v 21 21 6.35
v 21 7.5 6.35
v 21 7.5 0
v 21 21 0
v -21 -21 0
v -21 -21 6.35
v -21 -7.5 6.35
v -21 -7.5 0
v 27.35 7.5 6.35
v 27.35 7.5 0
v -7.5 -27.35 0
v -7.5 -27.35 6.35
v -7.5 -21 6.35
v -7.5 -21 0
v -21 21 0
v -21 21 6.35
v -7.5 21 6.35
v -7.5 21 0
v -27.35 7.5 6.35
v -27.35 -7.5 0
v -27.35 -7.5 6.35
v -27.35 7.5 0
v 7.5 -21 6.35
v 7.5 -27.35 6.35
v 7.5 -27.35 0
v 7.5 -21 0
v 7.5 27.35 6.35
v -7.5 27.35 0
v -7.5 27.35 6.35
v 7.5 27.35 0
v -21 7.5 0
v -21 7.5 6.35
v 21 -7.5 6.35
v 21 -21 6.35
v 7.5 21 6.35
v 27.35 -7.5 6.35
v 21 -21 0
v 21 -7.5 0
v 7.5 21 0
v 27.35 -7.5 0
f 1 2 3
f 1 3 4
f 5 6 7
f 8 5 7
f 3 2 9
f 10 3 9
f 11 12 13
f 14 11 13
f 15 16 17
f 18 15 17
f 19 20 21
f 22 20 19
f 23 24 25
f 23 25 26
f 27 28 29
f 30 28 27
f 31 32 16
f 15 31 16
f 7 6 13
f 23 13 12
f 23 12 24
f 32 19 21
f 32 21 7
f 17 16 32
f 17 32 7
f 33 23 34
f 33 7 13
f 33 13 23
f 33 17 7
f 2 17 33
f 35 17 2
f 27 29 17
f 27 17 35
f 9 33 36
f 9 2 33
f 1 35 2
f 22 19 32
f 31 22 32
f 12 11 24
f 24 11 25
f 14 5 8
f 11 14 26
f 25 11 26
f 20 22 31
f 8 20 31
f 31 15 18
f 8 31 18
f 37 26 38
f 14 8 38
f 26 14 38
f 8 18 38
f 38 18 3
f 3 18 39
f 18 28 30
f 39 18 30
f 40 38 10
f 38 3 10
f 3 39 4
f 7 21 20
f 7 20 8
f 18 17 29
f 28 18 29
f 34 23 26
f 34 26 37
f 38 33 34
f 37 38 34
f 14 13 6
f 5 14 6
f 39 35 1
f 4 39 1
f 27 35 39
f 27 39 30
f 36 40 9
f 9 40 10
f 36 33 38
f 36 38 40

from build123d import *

# Parameters (mm, degrees)
SKETCH1_W           = 54.7
SKETCH1_H           = 54.7
BOSS_EXTRUDE1_DEPTH = 6.35
SKETCH2_W           = 6.35
SKETCH2_H           = 13.5
SKETCH2_H_2         = 6.35
SKETCH2_W_2         = 13.5
CUT_EXTRUDE1_DEPTH  = 40.196524081


with BuildPart() as part:
    # Sketch1 → Boss-Extrude1 (new body)
    with BuildSketch(Plane.XY):
        Rectangle(SKETCH1_W, SKETCH1_H)
    extrude(amount=BOSS_EXTRUDE1_DEPTH)

    # Sketch2 → Cut-Extrude1 (cut, through all)
    with BuildSketch(Plane.XY.offset(6.35)):
        with Locations((-24.175, 14.25)):
            Rectangle(SKETCH2_W, SKETCH2_H)
        with Locations((-24.175, 24.175)):
            Rectangle(SKETCH2_W, SKETCH2_H_2)
        with Locations((-14.25, 24.175)):
            Rectangle(SKETCH2_W_2, SKETCH2_H_2)
        with Locations((14.25, 24.175)):
            Rectangle(SKETCH2_W_2, SKETCH2_H_2)
        with Locations((24.175, 24.175)):
            Rectangle(SKETCH2_W, SKETCH2_H_2)
        with Locations((24.175, 14.25)):
            Rectangle(SKETCH2_W, SKETCH2_H)
        with Locations((24.175, -14.25)):
            Rectangle(SKETCH2_W, SKETCH2_H)
        with Locations((24.175, -24.175)):
            Rectangle(SKETCH2_W, SKETCH2_H_2)
        with Locations((14.25, -24.175)):
            Rectangle(SKETCH2_W_2, SKETCH2_H_2)
        with Locations((-14.25, -24.175)):
            Rectangle(SKETCH2_W_2, SKETCH2_H_2)
        with Locations((-24.175, -24.175)):
            Rectangle(SKETCH2_W, SKETCH2_H_2)
        with Locations((-24.175, -14.25)):
            Rectangle(SKETCH2_W, SKETCH2_H)
    extrude(amount=-CUT_EXTRUDE1_DEPTH, mode=Mode.SUBTRACT)


solid = part.part
